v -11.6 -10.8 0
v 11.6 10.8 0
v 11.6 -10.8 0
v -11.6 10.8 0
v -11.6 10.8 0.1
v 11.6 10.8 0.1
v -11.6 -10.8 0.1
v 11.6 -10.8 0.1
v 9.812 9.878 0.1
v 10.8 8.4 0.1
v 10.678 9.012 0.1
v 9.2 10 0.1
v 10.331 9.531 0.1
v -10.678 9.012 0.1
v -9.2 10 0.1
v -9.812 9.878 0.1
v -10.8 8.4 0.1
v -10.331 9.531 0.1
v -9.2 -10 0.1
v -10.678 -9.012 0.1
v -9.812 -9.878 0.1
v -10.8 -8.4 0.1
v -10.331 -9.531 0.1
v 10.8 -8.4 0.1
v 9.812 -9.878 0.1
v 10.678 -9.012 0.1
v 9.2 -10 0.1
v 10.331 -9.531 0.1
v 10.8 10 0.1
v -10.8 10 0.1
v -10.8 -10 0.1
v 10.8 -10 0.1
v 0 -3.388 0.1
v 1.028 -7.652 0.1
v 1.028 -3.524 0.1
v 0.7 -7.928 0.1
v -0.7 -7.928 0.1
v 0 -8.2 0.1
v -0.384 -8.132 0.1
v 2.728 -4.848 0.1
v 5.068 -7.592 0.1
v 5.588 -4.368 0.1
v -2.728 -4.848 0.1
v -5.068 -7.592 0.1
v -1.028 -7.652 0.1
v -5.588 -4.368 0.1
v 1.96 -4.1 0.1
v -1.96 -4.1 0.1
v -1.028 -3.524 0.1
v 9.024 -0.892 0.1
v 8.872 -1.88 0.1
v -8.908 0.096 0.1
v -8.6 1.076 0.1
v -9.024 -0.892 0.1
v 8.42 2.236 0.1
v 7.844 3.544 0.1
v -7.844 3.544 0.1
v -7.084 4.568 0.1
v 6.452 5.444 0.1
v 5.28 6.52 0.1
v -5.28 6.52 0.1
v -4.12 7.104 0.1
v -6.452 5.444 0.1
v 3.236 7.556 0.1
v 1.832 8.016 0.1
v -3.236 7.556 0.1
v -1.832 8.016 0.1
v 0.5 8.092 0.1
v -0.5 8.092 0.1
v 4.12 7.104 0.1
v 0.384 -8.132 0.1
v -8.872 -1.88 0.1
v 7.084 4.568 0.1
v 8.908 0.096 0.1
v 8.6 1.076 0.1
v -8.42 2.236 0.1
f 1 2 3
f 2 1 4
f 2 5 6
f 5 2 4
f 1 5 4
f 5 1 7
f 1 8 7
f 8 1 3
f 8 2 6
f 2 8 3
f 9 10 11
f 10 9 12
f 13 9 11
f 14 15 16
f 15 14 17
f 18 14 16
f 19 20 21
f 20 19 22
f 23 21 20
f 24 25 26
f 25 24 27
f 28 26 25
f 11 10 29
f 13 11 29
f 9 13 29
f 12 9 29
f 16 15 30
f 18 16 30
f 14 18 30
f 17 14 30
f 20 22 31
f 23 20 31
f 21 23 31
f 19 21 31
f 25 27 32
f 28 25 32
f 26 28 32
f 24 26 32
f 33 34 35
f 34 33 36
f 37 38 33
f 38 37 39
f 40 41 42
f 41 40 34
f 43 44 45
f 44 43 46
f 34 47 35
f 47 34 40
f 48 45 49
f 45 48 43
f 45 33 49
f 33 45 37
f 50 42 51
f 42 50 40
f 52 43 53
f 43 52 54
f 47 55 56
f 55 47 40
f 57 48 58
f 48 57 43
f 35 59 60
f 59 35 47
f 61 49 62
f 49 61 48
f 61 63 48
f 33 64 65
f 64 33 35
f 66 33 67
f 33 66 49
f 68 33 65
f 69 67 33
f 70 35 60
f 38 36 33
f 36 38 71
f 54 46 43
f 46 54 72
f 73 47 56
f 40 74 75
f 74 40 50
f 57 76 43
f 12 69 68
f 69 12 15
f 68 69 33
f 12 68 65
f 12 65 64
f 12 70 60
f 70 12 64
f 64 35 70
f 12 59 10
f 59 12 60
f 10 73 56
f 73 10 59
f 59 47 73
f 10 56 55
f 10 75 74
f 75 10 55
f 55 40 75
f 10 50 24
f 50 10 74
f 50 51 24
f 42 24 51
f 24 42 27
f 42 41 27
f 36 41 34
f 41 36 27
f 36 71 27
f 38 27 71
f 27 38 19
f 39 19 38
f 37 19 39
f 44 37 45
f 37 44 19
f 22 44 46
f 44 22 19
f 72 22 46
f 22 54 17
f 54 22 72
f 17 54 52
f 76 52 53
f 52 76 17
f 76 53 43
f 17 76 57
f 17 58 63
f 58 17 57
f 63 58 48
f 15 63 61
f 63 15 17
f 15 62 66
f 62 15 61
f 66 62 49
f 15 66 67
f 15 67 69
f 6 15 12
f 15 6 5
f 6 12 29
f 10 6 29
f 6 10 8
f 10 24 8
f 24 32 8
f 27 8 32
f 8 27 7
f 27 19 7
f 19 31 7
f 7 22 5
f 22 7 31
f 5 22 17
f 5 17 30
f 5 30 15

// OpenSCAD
// file: ../p/4-4edge.scad
use <../lib.scad>
$fa=1; $fs=0.2;
function ldraw_lib__4_4edge(realsolid=false) = [
// 0 Circle 1.0
// 0 Name: 4-4edge.dat
// 0 Author: James Jessiman
// 0 !LDRAW_ORG Primitive UPDATE 2017-01
// 0 !LICENSE Licensed under CC BY 2.0 and CC BY 4.0 : see CAreadme.txt
// 
// 0 BFC CERTIFY CCW
  [0,"BFC","CERTIFY"],
  [0,"BFC","CCW"],
// 
// 0 !HISTORY 1998-12-15 [PTadmin] Official Update 1998-10
// 0 !HISTORY 2005-12-28 [PTadmin] Official Update 2005-01
// 0 !HISTORY 2007-06-24 [PTadmin] Header formatted for Contributor Agreement
// 0 !HISTORY 2008-07-01 [PTadmin] Official Update 2008-01
// 0 !HISTORY 2017-01-15 [Steffen] BFCed
// 0 !HISTORY 2017-12-30 [PTadmin] Official Update 2017-01
// 
// 
// 2 24 1 0 0 0.9239 0 0.3827
  [2,24,1,0,0,0.9239,0,0.3827],
// 2 24 0.9239 0 0.3827 0.7071 0 0.7071
  [2,24,0.9239,0,0.3827,0.7071,0,0.7071],
// 2 24 0.7071 0 0.7071 0.3827 0 0.9239
  [2,24,0.7071,0,0.7071,0.3827,0,0.9239],
// 2 24 0.3827 0 0.9239 0 0 1
  [2,24,0.3827,0,0.9239,0,0,1],
// 2 24 0 0 1 -0.3827 0 0.9239
  [2,24,0,0,1,-0.3827,0,0.9239],
// 2 24 -0.3827 0 0.9239 -0.7071 0 0.7071
  [2,24,-0.3827,0,0.9239,-0.7071,0,0.7071],
// 2 24 -0.7071 0 0.7071 -0.9239 0 0.3827
  [2,24,-0.7071,0,0.7071,-0.9239,0,0.3827],
// 2 24 -0.9239 0 0.3827 -1 0 -0
  [2,24,-0.9239,0,0.3827,-1,0,-0],
// 2 24 -1 0 -0 -0.9239 0 -0.3827
  [2,24,-1,0,-0,-0.9239,0,-0.3827],
// 2 24 -0.9239 0 -0.3827 -0.7071 0 -0.7071
  [2,24,-0.9239,0,-0.3827,-0.7071,0,-0.7071],
// 2 24 -0.7071 0 -0.7071 -0.3827 0 -0.9239
  [2,24,-0.7071,0,-0.7071,-0.3827,0,-0.9239],
// 2 24 -0.3827 0 -0.9239 0 0 -1
  [2,24,-0.3827,0,-0.9239,0,0,-1],
// 2 24 0 0 -1 0.3827 0 -0.9239
  [2,24,0,0,-1,0.3827,0,-0.9239],
// 2 24 0.3827 0 -0.9239 0.7071 0 -0.7071
  [2,24,0.3827,0,-0.9239,0.7071,0,-0.7071],
// 2 24 0.7071 0 -0.7071 0.9239 0 -0.3827
  [2,24,0.7071,0,-0.7071,0.9239,0,-0.3827],
// 2 24 0.9239 0 -0.3827 1 0 0
  [2,24,0.9239,0,-0.3827,1,0,0],
];
module ldraw_lib__4_4edge(step=0, col=false, unit=2/5, alt=false, line=0.2, solid=!$preview)
    makepoly(ldraw_lib__4_4edge(solid), step=step, col=col, unit=unit, alt=alt, line=line, solid=solid);
ldraw_lib__4_4edge(line=0.2);
// file: ../p/4-4disc.scad
use <../lib.scad>
$fa=1; $fs=0.2;
function ldraw_lib__4_4disc(realsolid=false) = [
// 0 Disc 1.0
// 0 Name: 4-4disc.dat
// 0 Author: James Jessiman
// 0 !LDRAW_ORG Primitive UPDATE 2002-02
// 0 !LICENSE Licensed under CC BY 2.0 and CC BY 4.0 : see CAreadme.txt
// 
// 0 BFC CERTIFY CCW
  [0,"BFC","CERTIFY"],
  [0,"BFC","CCW"],
// 
// 0 !HISTORY 1998-12-15 [PTadmin] Official Update 1998-10
// 0 !HISTORY 2002-03-23 [sbliss] Added BFC statement
// 0 !HISTORY 2002-04-25 [PTadmin] Official Update 2002-02
// 0 !HISTORY 2007-06-24 [PTadmin] Header formatted for Contributor Agreement
// 0 !HISTORY 2008-07-01 [PTadmin] Official Update 2008-01
// 
// 
// 3 16 0 0 0 1 0 0 0.9239 0 0.3827
  [3,16,0,0,0,1,0,0,0.9239,0,0.3827],
// 3 16 0 0 0 0.9239 0 0.3827 0.7071 0 0.7071
  [3,16,0,0,0,0.9239,0,0.3827,0.7071,0,0.7071],
// 3 16 0 0 0 0.7071 0 0.7071 0.3827 0 0.9239
  [3,16,0,0,0,0.7071,0,0.7071,0.3827,0,0.9239],
// 3 16 0 0 0 0.3827 0 0.9239 0 0 1
  [3,16,0,0,0,0.3827,0,0.9239,0,0,1],
// 3 16 0 0 0 0 0 1 -0.3827 0 0.9239
  [3,16,0,0,0,0,0,1,-0.3827,0,0.9239],
// 3 16 0 0 0 -0.3827 0 0.9239 -0.7071 0 0.7071
  [3,16,0,0,0,-0.3827,0,0.9239,-0.7071,0,0.7071],
// 3 16 0 0 0 -0.7071 0 0.7071 -0.9239 0 0.3827
  [3,16,0,0,0,-0.7071,0,0.7071,-0.9239,0,0.3827],
// 3 16 0 0 0 -0.9239 0 0.3827 -1 0 -0
  [3,16,0,0,0,-0.9239,0,0.3827,-1,0,-0],
// 3 16 0 0 0 -1 0 -0 -0.9239 0 -0.3827
  [3,16,0,0,0,-1,0,-0,-0.9239,0,-0.3827],
// 3 16 0 0 0 -0.9239 0 -0.3827 -0.7071 0 -0.7071
  [3,16,0,0,0,-0.9239,0,-0.3827,-0.7071,0,-0.7071],
// 3 16 0 0 0 -0.7071 0 -0.7071 -0.3827 0 -0.9239
  [3,16,0,0,0,-0.7071,0,-0.7071,-0.3827,0,-0.9239],
// 3 16 0 0 0 -0.3827 0 -0.9239 0 0 -1
  [3,16,0,0,0,-0.3827,0,-0.9239,0,0,-1],
// 3 16 0 0 0 0 0 -1 0.3827 0 -0.9239
  [3,16,0,0,0,0,0,-1,0.3827,0,-0.9239],
// 3 16 0 0 0 0.3827 0 -0.9239 0.7071 0 -0.7071
  [3,16,0,0,0,0.3827,0,-0.9239,0.7071,0,-0.7071],
// 3 16 0 0 0 0.7071 0 -0.7071 0.9239 0 -0.3827
  [3,16,0,0,0,0.7071,0,-0.7071,0.9239,0,-0.3827],
// 3 16 0 0 0 0.9239 0 -0.3827 1 0 0
  [3,16,0,0,0,0.9239,0,-0.3827,1,0,0],
// 0
];
module ldraw_lib__4_4disc(step=0, col=false, unit=2/5, alt=false, line=0.2, solid=!$preview)
    makepoly(ldraw_lib__4_4disc(solid), step=step, col=col, unit=unit, alt=alt, line=line, solid=solid);
ldraw_lib__4_4disc(line=0.2);
// file: ../p/4-4cyli.scad
use <../lib.scad>
$fa=1; $fs=0.2;
function ldraw_lib__4_4cyli(realsolid=false) = [
// 0 Cylinder 1.0
// 0 Name: 4-4cyli.dat
// 0 Author: James Jessiman
// 0 !LDRAW_ORG Primitive UPDATE 2005-01
// 0 !LICENSE Licensed under CC BY 2.0 and CC BY 4.0 : see CAreadme.txt
// 
// 0 BFC CERTIFY CCW
  [0,"BFC","CERTIFY"],
  [0,"BFC","CCW"],
// 
// 0 !HISTORY 1998-12-15 [PTadmin] Official Update 1998-10
// 0 !HISTORY 2002-03-23 [sbliss] Added BFC statement; merged headers from files in distributions LDraw 0.27 and Complete.
// 0 !HISTORY 2002-04-25 [PTadmin] Official Update 2002-02
// 0 !HISTORY 2004-12-14 [guyvivan] BFC CCW
// 0 !HISTORY 2005-12-28 [PTadmin] Official Update 2005-01
// 0 !HISTORY 2007-06-24 [PTadmin] Header formatted for Contributor Agreement
// 0 !HISTORY 2008-07-01 [PTadmin] Official Update 2008-01
// 
// 
// 4 16 1 1 0 0.9239 1 0.3827 0.9239 0 0.3827 1 0 0
  [4,16,1,1,0,0.9239,1,0.3827,0.9239,0,0.3827,1,0,0],
// 5 24 1 0 0 1 1 0 0.9239 0 0.3827 0.9239 0 -0.3827
  [5,24,1,0,0,1,1,0,0.9239,0,0.3827,0.9239,0,-0.3827],
// 4 16 0.9239 1 0.3827 0.7071 1 0.7071 0.7071 0 0.7071 0.9239 0 0.3827
  [4,16,0.9239,1,0.3827,0.7071,1,0.7071,0.7071,0,0.7071,0.9239,0,0.3827],
// 5 24 0.9239 0 0.3827 0.9239 1 0.3827 0.7071 0 0.7071 1 0 0
  [5,24,0.9239,0,0.3827,0.9239,1,0.3827,0.7071,0,0.7071,1,0,0],
// 4 16 0.7071 1 0.7071 0.3827 1 0.9239 0.3827 0 0.9239 0.7071 0 0.7071
  [4,16,0.7071,1,0.7071,0.3827,1,0.9239,0.3827,0,0.9239,0.7071,0,0.7071],
// 5 24 0.7071 0 0.7071 0.7071 1 0.7071 0.3827 0 0.9239 0.9239 0 0.3827
  [5,24,0.7071,0,0.7071,0.7071,1,0.7071,0.3827,0,0.9239,0.9239,0,0.3827],
// 4 16 0.3827 1 0.9239 0 1 1 0 0 1 0.3827 0 0.9239
  [4,16,0.3827,1,0.9239,0,1,1,0,0,1,0.3827,0,0.9239],
// 5 24 0.3827 0 0.9239 0.3827 1 0.9239 0 0 1 0.7071 0 0.7071
  [5,24,0.3827,0,0.9239,0.3827,1,0.9239,0,0,1,0.7071,0,0.7071],
// 4 16 0 1 1 -0.3827 1 0.9239 -0.3827 0 0.9239 0 0 1
  [4,16,0,1,1,-0.3827,1,0.9239,-0.3827,0,0.9239,0,0,1],
// 5 24 0 0 1 0 1 1 -0.3827 0 0.9239 0.3827 0 0.9239
  [5,24,0,0,1,0,1,1,-0.3827,0,0.9239,0.3827,0,0.9239],
// 4 16 -0.3827 1 0.9239 -0.7071 1 0.7071 -0.7071 0 0.7071 -0.3827 0 0.9239
  [4,16,-0.3827,1,0.9239,-0.7071,1,0.7071,-0.7071,0,0.7071,-0.3827,0,0.9239],
// 5 24 -0.3827 0 0.9239 -0.3827 1 0.9239 -0.7071 0 0.7071 0 0 1
  [5,24,-0.3827,0,0.9239,-0.3827,1,0.9239,-0.7071,0,0.7071,0,0,1],
// 4 16 -0.7071 1 0.7071 -0.9239 1 0.3827 -0.9239 0 0.3827 -0.7071 0 0.7071
  [4,16,-0.7071,1,0.7071,-0.9239,1,0.3827,-0.9239,0,0.3827,-0.7071,0,0.7071],
// 5 24 -0.7071 0 0.7071 -0.7071 1 0.7071 -0.9239 0 0.3827 -0.3827 0 0.9239
  [5,24,-0.7071,0,0.7071,-0.7071,1,0.7071,-0.9239,0,0.3827,-0.3827,0,0.9239],
// 4 16 -0.9239 1 0.3827 -1 1 0 -1 0 0 -0.9239 0 0.3827
  [4,16,-0.9239,1,0.3827,-1,1,0,-1,0,0,-0.9239,0,0.3827],
// 5 24 -0.9239 0 0.3827 -0.9239 1 0.3827 -1 0 0 -0.7071 0 0.7071
  [5,24,-0.9239,0,0.3827,-0.9239,1,0.3827,-1,0,0,-0.7071,0,0.7071],
// 4 16 -1 1 0 -0.9239 1 -0.3827 -0.9239 0 -0.3827 -1 0 0
  [4,16,-1,1,0,-0.9239,1,-0.3827,-0.9239,0,-0.3827,-1,0,0],
// 5 24 -1 0 0 -1 1 0 -0.9239 0 -0.3827 -0.9239 0 0.3827
  [5,24,-1,0,0,-1,1,0,-0.9239,0,-0.3827,-0.9239,0,0.3827],
// 4 16 -0.9239 1 -0.3827 -0.7071 1 -0.7071 -0.7071 0 -0.7071 -0.9239 0 -0.3827
  [4,16,-0.9239,1,-0.3827,-0.7071,1,-0.7071,-0.7071,0,-0.7071,-0.9239,0,-0.3827],
// 5 24 -0.9239 0 -0.3827 -0.9239 1 -0.3827 -0.7071 0 -0.7071 -1 0 0
  [5,24,-0.9239,0,-0.3827,-0.9239,1,-0.3827,-0.7071,0,-0.7071,-1,0,0],
// 4 16 -0.7071 1 -0.7071 -0.3827 1 -0.9239 -0.3827 0 -0.9239 -0.7071 0 -0.7071
  [4,16,-0.7071,1,-0.7071,-0.3827,1,-0.9239,-0.3827,0,-0.9239,-0.7071,0,-0.7071],
// 5 24 -0.7071 0 -0.7071 -0.7071 1 -0.7071 -0.3827 0 -0.9239 -0.9239 0 -0.3827
  [5,24,-0.7071,0,-0.7071,-0.7071,1,-0.7071,-0.3827,0,-0.9239,-0.9239,0,-0.3827],
// 4 16 -0.3827 1 -0.9239 0 1 -1 0 0 -1 -0.3827 0 -0.9239
  [4,16,-0.3827,1,-0.9239,0,1,-1,0,0,-1,-0.3827,0,-0.9239],
// 5 24 -0.3827 0 -0.9239 -0.3827 1 -0.9239 0 0 -1 -0.7071 0 -0.7071
  [5,24,-0.3827,0,-0.9239,-0.3827,1,-0.9239,0,0,-1,-0.7071,0,-0.7071],
// 4 16 0 1 -1 0.3827 1 -0.9239 0.3827 0 -0.9239 0 0 -1
  [4,16,0,1,-1,0.3827,1,-0.9239,0.3827,0,-0.9239,0,0,-1],
// 5 24 0 0 -1 0 1 -1 0.3827 0 -0.9239 -0.3827 0 -0.9239
  [5,24,0,0,-1,0,1,-1,0.3827,0,-0.9239,-0.3827,0,-0.9239],
// 4 16 0.3827 1 -0.9239 0.7071 1 -0.7071 0.7071 0 -0.7071 0.3827 0 -0.9239
  [4,16,0.3827,1,-0.9239,0.7071,1,-0.7071,0.7071,0,-0.7071,0.3827,0,-0.9239],
// 5 24 0.3827 0 -0.9239 0.3827 1 -0.9239 0.7071 0 -0.7071 0 0 -1
  [5,24,0.3827,0,-0.9239,0.3827,1,-0.9239,0.7071,0,-0.7071,0,0,-1],
// 4 16 0.7071 1 -0.7071 0.9239 1 -0.3827 0.9239 0 -0.3827 0.7071 0 -0.7071
  [4,16,0.7071,1,-0.7071,0.9239,1,-0.3827,0.9239,0,-0.3827,0.7071,0,-0.7071],
// 5 24 0.7071 0 -0.7071 0.7071 1 -0.7071 0.9239 0 -0.3827 0.3827 0 -0.9239
  [5,24,0.7071,0,-0.7071,0.7071,1,-0.7071,0.9239,0,-0.3827,0.3827,0,-0.9239],
// 4 16 0.9239 1 -0.3827 1 1 0 1 0 0 0.9239 0 -0.3827
  [4,16,0.9239,1,-0.3827,1,1,0,1,0,0,0.9239,0,-0.3827],
// 5 24 0.9239 0 -0.3827 0.9239 1 -0.3827 1 0 0 0.7071 0 -0.7071
  [5,24,0.9239,0,-0.3827,0.9239,1,-0.3827,1,0,0,0.7071,0,-0.7071],
// 0
];
module ldraw_lib__4_4cyli(step=0, col=false, unit=2/5, alt=false, line=0.2, solid=!$preview)
    makepoly(ldraw_lib__4_4cyli(solid), step=step, col=col, unit=unit, alt=alt, line=line, solid=solid);
ldraw_lib__4_4cyli(line=0.2);
// file: ../p/stud3.scad
use <../lib.scad>
use <4-4cyli.scad>
use <4-4disc.scad>
use <4-4edge.scad>
$fa=1; $fs=0.2;
function ldraw_lib__stud3(realsolid=false) = realsolid ? 
    [openscad(translate([0,0,-eps()], o=cylinder(4+eps(), r=4)),2)] : [
// 0 Stud Tube Solid
// 0 Name: stud3.dat
// 0 Author: James Jessiman
// 0 !LDRAW_ORG Primitive UPDATE 2012-01
// 0 !LICENSE Licensed under CC BY 2.0 and CC BY 4.0 : see CAreadme.txt
// 
// 0 BFC CERTIFY CCW
  [0,"BFC","CERTIFY"],
  [0,"BFC","CCW"],
// 
// 0 !HISTORY 2002-04-04 [sbliss] Modified for BFC compliance
// 0 !HISTORY 2002-04-25 [PTadmin] Official Update 2002-02
// 0 !HISTORY 2007-06-24 [PTadmin] Header formatted for Contributor Agreement
// 0 !HISTORY 2008-07-01 [PTadmin] Official Update 2008-01
// 0 !HISTORY 2012-02-16 [Philo] Changed to CCW
// 0 !HISTORY 2012-03-30 [PTadmin] Official Update 2012-01
// 
// 
// 1 16 0 -4 0 4 0 0 0 1 0 0 0 4 4-4edge.dat
  [1,16,0,-4,0,4,0,0,0,1,0,0,0,4, ldraw_lib__4_4edge(realsolid)],
// 1 16 0 0 0 4 0 0 0 1 0 0 0 4 4-4edge.dat
  [1,16,0,0,0,4,0,0,0,1,0,0,0,4, ldraw_lib__4_4edge(realsolid)],
// 1 16 0 -4 0 4 0 0 0 1 0 0 0 4 4-4disc.dat
  [1,16,0,-4,0,4,0,0,0,1,0,0,0,4, ldraw_lib__4_4disc(realsolid)],
// 1 16 0 -4 0 4 0 0 0 4 0 0 0 4 4-4cyli.dat
  [1,16,0,-4,0,4,0,0,0,4,0,0,0,4, ldraw_lib__4_4cyli(realsolid)],
];
module ldraw_lib__stud3(step=0, col=false, unit=2/5, alt=false, line=0.2, solid=!$preview)
    makepoly(ldraw_lib__stud3(solid), step=step, col=col, unit=unit, alt=alt, line=line, solid=solid);
ldraw_lib__stud3(line=0.2);
// file: ../p/stud.scad
use <../lib.scad>
use <4-4cyli.scad>
use <4-4disc.scad>
use <4-4edge.scad>
$fa=1; $fs=0.2;
function ldraw_lib__stud(realsolid=false) = realsolid ? 
    [openscad(translate([0,0,-eps()], o=cylinder(4+eps(), r=6)),2)] : [
// 0 Stud
// 0 Name: stud.dat
// 0 Author: James Jessiman
// 0 !LDRAW_ORG Primitive UPDATE 2012-01
// 0 !LICENSE Licensed under CC BY 2.0 and CC BY 4.0 : see CAreadme.txt
// 
// 0 BFC CERTIFY CCW
  [0,"BFC","CERTIFY"],
  [0,"BFC","CCW"],
// 
// 0 !HISTORY 2002-04-04 [sbliss] Modified for BFC compliance
// 0 !HISTORY 2002-04-25 [PTadmin] Official Update 2002-02
// 0 !HISTORY 2007-06-24 [PTadmin] Header formatted for Contributor Agreement
// 0 !HISTORY 2008-07-01 [PTadmin] Official Update 2008-01
// 0 !HISTORY 2012-02-16 [Philo] Changed to CCW
// 0 !HISTORY 2012-03-30 [PTadmin] Official Update 2012-01
// 
// 
// 1 16 0 0 0 6 0 0 0 1 0 0 0 6 4-4edge.dat
  [1,16,0,0,0,6,0,0,0,1,0,0,0,6, ldraw_lib__4_4edge(realsolid)],
// 1 16 0 -4 0 6 0 0 0 1 0 0 0 6 4-4edge.dat
  [1,16,0,-4,0,6,0,0,0,1,0,0,0,6, ldraw_lib__4_4edge(realsolid)],
// 1 16 0 0 0 6 0 0 0 -4 0 0 0 6 4-4cyli.dat
  [1,16,0,0,0,6,0,0,0,-4,0,0,0,6, ldraw_lib__4_4cyli(realsolid)],
// 1 16 0 -4 0 6 0 0 0 1 0 0 0 6 4-4disc.dat
  [1,16,0,-4,0,6,0,0,0,1,0,0,0,6, ldraw_lib__4_4disc(realsolid)],
];
module ldraw_lib__stud(step=0, col=false, unit=2/5, alt=false, line=0.2, solid=!$preview)
    makepoly(ldraw_lib__stud(solid), step=step, col=col, unit=unit, alt=alt, line=line, solid=solid);
ldraw_lib__stud(line=0.2);
// file: ../p/box5.scad
use <../lib.scad>
$fa=1; $fs=0.2;
function ldraw_lib__box5(realsolid=false) = [
// 0 Box with 5 Faces and All Edges
// 0 Name: box5.dat
// 0 Author: James Jessiman
// 0 !LDRAW_ORG Primitive UPDATE 2012-01
// 0 !LICENSE Licensed under CC BY 2.0 and CC BY 4.0 : see CAreadme.txt
// 
// 0 BFC CERTIFY CCW
  [0,"BFC","CERTIFY"],
  [0,"BFC","CCW"],
// 
// 0 !HISTORY 2002-04-03 [sbliss] Modified for BFC compliance
// 0 !HISTORY 2002-04-25 [PTadmin] Official Update 2002-02
// 0 !HISTORY 2007-06-24 [PTadmin] Header formatted for Contributor Agreement
// 0 !HISTORY 2008-07-01 [PTadmin] Official Update 2008-01
// 0 !HISTORY 2012-02-16 [Philo] Changed to CCW
// 0 !HISTORY 2012-03-30 [PTadmin] Official Update 2012-01
// 
// 
// 2 24 1 1 1 -1 1 1
  [2,24,1,1,1,-1,1,1],
// 2 24 -1 1 1 -1 1 -1
  [2,24,-1,1,1,-1,1,-1],
// 2 24 -1 1 -1 1 1 -1
  [2,24,-1,1,-1,1,1,-1],
// 2 24 1 1 -1 1 1 1
  [2,24,1,1,-1,1,1,1],
// 2 24 1 0 1 -1 0 1
  [2,24,1,0,1,-1,0,1],
// 2 24 -1 0 1 -1 0 -1
  [2,24,-1,0,1,-1,0,-1],
// 2 24 -1 0 -1 1 0 -1
  [2,24,-1,0,-1,1,0,-1],
// 2 24 1 0 -1 1 0 1
  [2,24,1,0,-1,1,0,1],
// 2 24 1 0 1 1 1 1
  [2,24,1,0,1,1,1,1],
// 2 24 -1 0 1 -1 1 1
  [2,24,-1,0,1,-1,1,1],
// 2 24 1 0 -1 1 1 -1
  [2,24,1,0,-1,1,1,-1],
// 2 24 -1 0 -1 -1 1 -1
  [2,24,-1,0,-1,-1,1,-1],
// 4 16 -1 1 1 1 1 1 1 1 -1 -1 1 -1
  [4,16,-1,1,1,1,1,1,1,1,-1,-1,1,-1],
// 4 16 -1 1 1 -1 0 1 1 0 1 1 1 1
  [4,16,-1,1,1,-1,0,1,1,0,1,1,1,1],
// 4 16 -1 1 -1 -1 0 -1 -1 0 1 -1 1 1
  [4,16,-1,1,-1,-1,0,-1,-1,0,1,-1,1,1],
// 4 16 1 1 -1 1 0 -1 -1 0 -1 -1 1 -1
  [4,16,1,1,-1,1,0,-1,-1,0,-1,-1,1,-1],
// 4 16 1 1 1 1 0 1 1 0 -1 1 1 -1
  [4,16,1,1,1,1,0,1,1,0,-1,1,1,-1],
];
module ldraw_lib__box5(step=0, col=false, unit=2/5, alt=false, line=0.2, solid=!$preview)
    makepoly(ldraw_lib__box5(solid), step=step, col=col, unit=unit, alt=alt, line=line, solid=solid);
ldraw_lib__box5(line=0.2);
// file: ../p/box4t.scad
use <../lib.scad>
$fa=1; $fs=0.2;
function ldraw_lib__box4t(realsolid=false) = [
// 0 Box with 4 Adjacent Faces and All Edges
// 0 Name: box4t.dat
// 0 Author: Tore Eriksson [Tore_Eriksson]
// 0 !LDRAW_ORG Primitive UPDATE 2003-02
// 0 !LICENSE Licensed under CC BY 2.0 and CC BY 4.0 : see CAreadme.txt
// 
// 0 BFC CERTIFY CCW
  [0,"BFC","CERTIFY"],
  [0,"BFC","CCW"],
// 
// 0 !HISTORY 1997-09-29 [PTadmin] Official Update 1997-15
// 0 !HISTORY 2002-08-31 [izanette] Modified with WINDZ for BFC compliance
// 0 !HISTORY 2003-08-01 [PTadmin] Official Update 2003-02
// 0 !HISTORY 2007-06-24 [PTadmin] Header formatted for Contributor Agreement
// 0 !HISTORY 2008-07-01 [PTadmin] Official Update 2008-01
// 
// 
// 2 24 1 1 1 -1 1 1
  [2,24,1,1,1,-1,1,1],
// 2 24 -1 1 1 -1 1 -1
  [2,24,-1,1,1,-1,1,-1],
// 2 24 -1 1 -1 1 1 -1
  [2,24,-1,1,-1,1,1,-1],
// 2 24 1 1 -1 1 1 1
  [2,24,1,1,-1,1,1,1],
// 2 24 1 0 1 -1 0 1
  [2,24,1,0,1,-1,0,1],
// 2 24 -1 0 1 -1 0 -1
  [2,24,-1,0,1,-1,0,-1],
// 2 24 -1 0 -1 1 0 -1
  [2,24,-1,0,-1,1,0,-1],
// 2 24 1 0 -1 1 0 1
  [2,24,1,0,-1,1,0,1],
// 2 24 1 0 1 1 1 1
  [2,24,1,0,1,1,1,1],
// 2 24 -1 0 1 -1 1 1
  [2,24,-1,0,1,-1,1,1],
// 2 24 1 0 -1 1 1 -1
  [2,24,1,0,-1,1,1,-1],
// 2 24 -1 0 -1 -1 1 -1
  [2,24,-1,0,-1,-1,1,-1],
// 4 16 1 1 1 1 1 -1 -1 1 -1 -1 1 1
  [4,16,1,1,1,1,1,-1,-1,1,-1,-1,1,1],
// 4 16 1 1 1 -1 1 1 -1 0 1 1 0 1
  [4,16,1,1,1,-1,1,1,-1,0,1,1,0,1],
// 4 16 -1 1 1 -1 1 -1 -1 0 -1 -1 0 1
  [4,16,-1,1,1,-1,1,-1,-1,0,-1,-1,0,1],
// 0 4 16 -1 1 -1 -1 0 -1 1 0 -1 1 1 -1
// 4 16 1 1 -1 1 1 1 1 0 1 1 0 -1
  [4,16,1,1,-1,1,1,1,1,0,1,1,0,-1],
// 0
];
module ldraw_lib__box4t(step=0, col=false, unit=2/5, alt=false, line=0.2, solid=!$preview)
    makepoly(ldraw_lib__box4t(solid), step=step, col=col, unit=unit, alt=alt, line=line, solid=solid);
ldraw_lib__box4t(line=0.2);
// file: s/3004s01.scad
use <../../lib.scad>
use <../../p/box4t.scad>
use <../../p/box5.scad>
use <../../p/stud.scad>
use <../../p/stud3.scad>
$fa=1; $fs=0.2;
function ldraw_lib__s__3004s01(realsolid=false) = [
// 0 ~Brick  1 x  2 without Front Face
// 0 Name: s\3004s01.dat
// 0 Author: James Jessiman
// 0 !LDRAW_ORG Subpart UPDATE 2003-03
// 0 !LICENSE Licensed under CC BY 2.0 and CC BY 4.0 : see CAreadme.txt
// 
// 0 BFC CERTIFY CCW
  [0,"BFC","CERTIFY"],
  [0,"BFC","CCW"],
// 
// 0 !HISTORY 2003-09-07 [jriley] Subfiling, BFC
// 0 !HISTORY 2003-12-19 [PTadmin] Official Update 2003-03
// 0 !HISTORY 2007-08-29 [PTadmin] Header formatted for Contributor Agreement
// 0 !HISTORY 2008-07-01 [PTadmin] Official Update 2008-01
// 
// 
// 1 16 0 4 0 1 0 0 0 -5 0 0 0 1 stud3.dat
  [1,16,0,4,0,1,0,0,0,-5,0,0,0,1, ldraw_lib__stud3(realsolid)],
// 0 BFC INVERTNEXT
  [0,"BFC","INVERTNEXT"],
// 1 16 0 24 0 16 0 0 0 -20 0 0 0 6 box5.dat
  [1,16,0,24,0,16,0,0,0,-20,0,0,0,6, ldraw_lib__box5(realsolid)],
// 4 16 20 24 10 16 24 6 -16 24 6 -20 24 10
  [4,16,20,24,10,16,24,6,-16,24,6,-20,24,10],
// 4 16 -20 24 10 -16 24 6 -16 24 -6 -20 24 -10
  [4,16,-20,24,10,-16,24,6,-16,24,-6,-20,24,-10],
// 4 16 -20 24 -10 -16 24 -6 16 24 -6 20 24 -10
  [4,16,-20,24,-10,-16,24,-6,16,24,-6,20,24,-10],
// 4 16 20 24 -10 16 24 -6 16 24 6 20 24 10
  [4,16,20,24,-10,16,24,-6,16,24,6,20,24,10],
// 1 16 0 24 0 20 0 0 0 -24 0 0 0 10 box4t.dat
  [1,16,0,24,0,20,0,0,0,-24,0,0,0,10, ldraw_lib__box4t(realsolid)],
// 1 16 10 0 0 1 0 0 0 1 0 0 0 1 stud.dat
  [1,16,10,0,0,1,0,0,0,1,0,0,0,1, ldraw_lib__stud(realsolid)],
// 1 16 -10 0 0 1 0 0 0 1 0 0 0 1 stud.dat
  [1,16,-10,0,0,1,0,0,0,1,0,0,0,1, ldraw_lib__stud(realsolid)],
// 0
];
module ldraw_lib__s__3004s01(step=0, col=false, unit=2/5, alt=false, line=0.2, solid=!$preview)
    makepoly(ldraw_lib__s__3004s01(solid), step=step, col=col, unit=unit, alt=alt, line=line, solid=solid);
ldraw_lib__s__3004s01(line=0.2);
// file: 3004.scad
use <../lib.scad>
use <s/3004s01.scad>
$fa=1; $fs=0.2;
function ldraw_lib__3004(realsolid=false) = [
// 0 Brick  1 x  2
// 0 Name: 3004.dat
// 0 Author: James Jessiman
// 0 !LDRAW_ORG Part UPDATE 2022-05
// 0 !LICENSE Licensed under CC BY 2.0 and CC BY 4.0 : see CAreadme.txt
// 
// 0 BFC CERTIFY CCW
  [0,"BFC","CERTIFY"],
  [0,"BFC","CCW"],
// 
// 0 !HISTORY 2001-10-26 [PTadmin] Official Update 2001-01
// 0 !HISTORY 2002-05-07 {unknown} BFC Certification
// 0 !HISTORY 2002-06-11 [PTadmin] Official Update 2002-03
// 0 !HISTORY 2007-05-07 [PTadmin] Header formatted for Contributor Agreement
// 0 !HISTORY 2008-07-01 [PTadmin] Official Update 2008-01
// 0 !HISTORY 2022-08-04 [MagFors] Using subfile
// 0 !HISTORY 2022-09-15 [PTadmin] Official Update 2022-05
// 
// 
// 1 16 0 0 0 1 0 0 0 1 0 0 0 1 s\3004s01.dat
  [1,16,0,0,0,1,0,0,0,1,0,0,0,1, ldraw_lib__s__3004s01(realsolid)],
// 4 16 -20 24 -10 20 24 -10 20 0 -10 -20 0 -10
  [4,16,-20,24,-10,20,24,-10,20,0,-10,-20,0,-10],
];
module ldraw_lib__3004(step=0, col=false, unit=2/5, alt=false, line=0.2, solid=!$preview)
    makepoly(ldraw_lib__3004(solid), step=step, col=col, unit=unit, alt=alt, line=line, solid=solid);
ldraw_lib__3004(line=0.2);
// file: ../p/box5-12.scad
use <../lib.scad>
$fa=1; $fs=0.2;
function ldraw_lib__box5_12(realsolid=false) = [
// 0 Box with 5 Faces without Any Edges
// 0 Name: box5-12.dat
// 0 Author: Chris Dee [cwdee]
// 0 !LDRAW_ORG Primitive UPDATE 2009-02
// 0 !LICENSE Licensed under CC BY 2.0 and CC BY 4.0 : see CAreadme.txt
// 
// 0 BFC CERTIFY CCW
  [0,"BFC","CERTIFY"],
  [0,"BFC","CCW"],
// 
// 0 !HISTORY 2009-09-03 [PTadmin] Official Update 2009-02
// 
// 
// 4 16 1 1 1 1 1 -1 -1 1 -1 -1 1 1
  [4,16,1,1,1,1,1,-1,-1,1,-1,-1,1,1],
// 4 16 -1 0 1 1 0 1 1 1 1 -1 1 1
  [4,16,-1,0,1,1,0,1,1,1,1,-1,1,1],
// 4 16 -1 0 -1 -1 0 1 -1 1 1 -1 1 -1
  [4,16,-1,0,-1,-1,0,1,-1,1,1,-1,1,-1],
// 4 16 1 0 -1 -1 0 -1 -1 1 -1 1 1 -1
  [4,16,1,0,-1,-1,0,-1,-1,1,-1,1,1,-1],
// 4 16 1 0 1 1 0 -1 1 1 -1 1 1 1
  [4,16,1,0,1,1,0,-1,1,1,-1,1,1,1],
// 0
];
module ldraw_lib__box5_12(step=0, col=false, unit=2/5, alt=false, line=0.2, solid=!$preview)
    makepoly(ldraw_lib__box5_12(solid), step=step, col=col, unit=unit, alt=alt, line=line, solid=solid);
ldraw_lib__box5_12(line=0.2);
// file: ../p/1-4ndis.scad
use <../lib.scad>
$fa=1; $fs=0.2;
function ldraw_lib__1_4ndis(realsolid=false) = [
// 0 Disc Negative 0.25
// 0 Name: 1-4ndis.dat
// 0 Author: James Jessiman
// 0 !LDRAW_ORG Primitive UPDATE 2012-01
// 0 !LICENSE Licensed under CC BY 2.0 and CC BY 4.0 : see CAreadme.txt
// 
// 0 BFC CERTIFY CCW
  [0,"BFC","CERTIFY"],
  [0,"BFC","CCW"],
// 
// 0 !HISTORY 2002-03-23 [sbliss] Added BFC Statement
// 0 !HISTORY 2002-04-25 [PTadmin] Official Update 2002-02
// 0 !HISTORY 2007-06-22 [PTadmin] Header formatted for Contributor Agreement
// 0 !HISTORY 2008-07-01 [PTadmin] Official Update 2008-01
// 0 !HISTORY 2012-02-16 [Philo] Changed to CCW
// 0 !HISTORY 2012-03-30 [PTadmin] Official Update 2012-01
// 
// 
// 3 16 0.9239 0 0.3827 1 0 0 1 0 1
  [3,16,0.9239,0,0.3827,1,0,0,1,0,1],
// 3 16 0.7071 0 0.7071 0.9239 0 0.3827 1 0 1
  [3,16,0.7071,0,0.7071,0.9239,0,0.3827,1,0,1],
// 3 16 0.3827 0 0.9239 0.7071 0 0.7071 1 0 1
  [3,16,0.3827,0,0.9239,0.7071,0,0.7071,1,0,1],
// 3 16 0 0 1 0.3827 0 0.9239 1 0 1
  [3,16,0,0,1,0.3827,0,0.9239,1,0,1],
];
module ldraw_lib__1_4ndis(step=0, col=false, unit=2/5, alt=false, line=0.2, solid=!$preview)
    makepoly(ldraw_lib__1_4ndis(solid), step=step, col=col, unit=unit, alt=alt, line=line, solid=solid);
ldraw_lib__1_4ndis(line=0.2);
// file: ../p/1-4chrd.scad
use <../lib.scad>
$fa=1; $fs=0.2;
function ldraw_lib__1_4chrd(realsolid=false) = [
// 0 Chord 0.25
// 0 Name: 1-4chrd.dat
// 0 Author: Tony Hafner [hafhead]
// 0 !LDRAW_ORG Primitive UPDATE 2012-02
// 0 !LICENSE Licensed under CC BY 2.0 and CC BY 4.0 : see CAreadme.txt
// 
// 0 BFC CERTIFY CCW
  [0,"BFC","CERTIFY"],
  [0,"BFC","CCW"],
// 
// 0 !HISTORY 2004-04-22 [PTadmin] Official Update 2004-02
// 0 !HISTORY 2007-10-09 [PTadmin] Header formatted for Contributor Agreement
// 0 !HISTORY 2008-07-01 [PTadmin] Official Update 2008-01
// 0 !HISTORY 2012-08-02 [MMR1988] Re-creation with PrimGen2 and Rectifier
// 0 !HISTORY 2012-08-09 [PTadmin] Official Update 2012-02
// 
// 
// 4 16 0.9239 0 0.3827 0.3827 0 0.9239 0 0 1 1 0 0
  [4,16,0.9239,0,0.3827,0.3827,0,0.9239,0,0,1,1,0,0],
// 3 16 0.7071 0 0.7071 0.3827 0 0.9239 0.9239 0 0.3827
  [3,16,0.7071,0,0.7071,0.3827,0,0.9239,0.9239,0,0.3827],
];
module ldraw_lib__1_4chrd(step=0, col=false, unit=2/5, alt=false, line=0.2, solid=!$preview)
    makepoly(ldraw_lib__1_4chrd(solid), step=step, col=col, unit=unit, alt=alt, line=line, solid=solid);
ldraw_lib__1_4chrd(line=0.2);
// main file
use <../lib.scad>
use <../p/1-4chrd.scad>
use <../p/1-4ndis.scad>
use <../p/box5-12.scad>
$fa=1; $fs=0.2;
function ldraw_lib__160425a(realsolid=false) = [
// 0 Sticker  2.7 x  2.9 with Shell Logo 1971 on Red Rounded Rectangle
// 0 Name: 160425a.dat
// 0 Author: Takeshi Takahashi [RainbowDolphin]
// 0 !LDRAW_ORG Part UPDATE 2022-05
// 0 !LICENSE Licensed under CC BY 2.0 and CC BY 4.0 : see CAreadme.txt
// 
// 0 BFC CERTIFY CCW
  [0,"BFC","CERTIFY"],
  [0,"BFC","CCW"],
// 
// 0 !KEYWORDS Bricklink 6394stk01, Brickowl 826936, Metro park, Rebrickable 160425
// 0 !KEYWORDS Service station, Set 6394, Signboard
// 
// 0 !HISTORY 2022-09-15 [PTadmin] Official Update 2022-05
// 
// 
// 1 16 0 -0.25 0 29 0 0 0 0.25 0 0 0 27 box5-12.dat
  [1,16,0,-0.25,0,29,0,0,0,0.25,0,0,0,27, ldraw_lib__box5_12(realsolid)],
// 1 4 23 -0.25 21 4 0 0 0 1 0 0 0 4 1-4chrd.dat
  [1,4,23,-0.25,21,4,0,0,0,1,0,0,0,4, ldraw_lib__1_4chrd(realsolid)],
// 1 4 -23 -0.25 21 0 0 -4 0 1 0 4 0 0 1-4chrd.dat
  [1,4,-23,-0.25,21,0,0,-4,0,1,0,4,0,0, ldraw_lib__1_4chrd(realsolid)],
// 1 4 -23 -0.25 -21 -4 0 0 0 1 0 0 0 -4 1-4chrd.dat
  [1,4,-23,-0.25,-21,-4,0,0,0,1,0,0,0,-4, ldraw_lib__1_4chrd(realsolid)],
// 1 4 23 -0.25 -21 0 0 4 0 1 0 -4 0 0 1-4chrd.dat
  [1,4,23,-0.25,-21,0,0,4,0,1,0,-4,0,0, ldraw_lib__1_4chrd(realsolid)],
// 1 15 23 -0.25 21 4 0 0 0 1 0 0 0 4 1-4ndis.dat
  [1,15,23,-0.25,21,4,0,0,0,1,0,0,0,4, ldraw_lib__1_4ndis(realsolid)],
// 1 15 -23 -0.25 21 0 0 -4 0 1 0 4 0 0 1-4ndis.dat
  [1,15,-23,-0.25,21,0,0,-4,0,1,0,4,0,0, ldraw_lib__1_4ndis(realsolid)],
// 1 15 -23 -0.25 -21 -4 0 0 0 1 0 0 0 -4 1-4ndis.dat
  [1,15,-23,-0.25,-21,-4,0,0,0,1,0,0,0,-4, ldraw_lib__1_4ndis(realsolid)],
// 1 15 23 -0.25 -21 0 0 4 0 1 0 -4 0 0 1-4ndis.dat
  [1,15,23,-0.25,-21,0,0,4,0,1,0,-4,0,0, ldraw_lib__1_4ndis(realsolid)],
// 4 14 0 -0.25 -8.47 1.75 -0.25 -19.82 2.57 -0.25 -19.13 2.57 -0.25 -8.81
  [4,14,0,-0.25,-8.47,1.75,-0.25,-19.82,2.57,-0.25,-19.13,2.57,-0.25,-8.81],
// 4 14 -0.96 -0.25 -20.33 0 -0.25 -20.5 0 -0.25 -8.47 -1.75 -0.25 -19.82
  [4,14,-0.96,-0.25,-20.33,0,-0.25,-20.5,0,-0.25,-8.47,-1.75,-0.25,-19.82],
// 4 14 12.67 -0.25 -18.98 13.97 -0.25 -10.92 6.82 -0.25 -12.12 2.57 -0.25 -19.13
  [4,14,12.67,-0.25,-18.98,13.97,-0.25,-10.92,6.82,-0.25,-12.12,2.57,-0.25,-19.13],
// 4 14 -13.97 -0.25 -10.92 -12.67 -0.25 -18.98 -2.57 -0.25 -19.13 -6.82 -0.25 -12.12
  [4,14,-13.97,-0.25,-10.92,-12.67,-0.25,-18.98,-2.57,-0.25,-19.13,-6.82,-0.25,-12.12],
// 4 14 2.57 -0.25 -19.13 6.82 -0.25 -12.12 4.9 -0.25 -10.25 2.57 -0.25 -8.81
  [4,14,2.57,-0.25,-19.13,6.82,-0.25,-12.12,4.9,-0.25,-10.25,2.57,-0.25,-8.81],
// 4 14 -4.9 -0.25 -10.25 -6.82 -0.25 -12.12 -2.57 -0.25 -19.13 -2.57 -0.25 -8.81
  [4,14,-4.9,-0.25,-10.25,-6.82,-0.25,-12.12,-2.57,-0.25,-19.13,-2.57,-0.25,-8.81],
// 4 14 0 -0.25 -8.47 -2.57 -0.25 -8.81 -2.57 -0.25 -19.13 -1.75 -0.25 -19.82
  [4,14,0,-0.25,-8.47,-2.57,-0.25,-8.81,-2.57,-0.25,-19.13,-1.75,-0.25,-19.82],
// 4 14 6.82 -0.25 -12.12 13.97 -0.25 -10.92 22.18 -0.25 -4.7 22.56 -0.25 -2.23
  [4,14,6.82,-0.25,-12.12,13.97,-0.25,-10.92,22.18,-0.25,-4.7,22.56,-0.25,-2.23],
// 4 14 -6.82 -0.25 -12.12 -21.5 -0.25 2.69 -22.27 -0.25 0.24 -22.56 -0.25 -2.23
  [4,14,-6.82,-0.25,-12.12,-21.5,-0.25,2.69,-22.27,-0.25,0.24,-22.56,-0.25,-2.23],
// 4 14 4.9 -0.25 -10.25 6.82 -0.25 -12.12 21.05 -0.25 5.59 19.61 -0.25 8.86
  [4,14,4.9,-0.25,-10.25,6.82,-0.25,-12.12,21.05,-0.25,5.59,19.61,-0.25,8.86],
// 4 14 -4.9 -0.25 -10.25 -17.71 -0.25 11.42 -19.61 -0.25 8.86 -6.82 -0.25 -12.12
  [4,14,-4.9,-0.25,-10.25,-17.71,-0.25,11.42,-19.61,-0.25,8.86,-6.82,-0.25,-12.12],
// 4 14 2.57 -0.25 -8.81 4.9 -0.25 -10.25 16.129 -0.25 13.61 13.2 -0.25 16.3
  [4,14,2.57,-0.25,-8.81,4.9,-0.25,-10.25,16.129,-0.25,13.61,13.2,-0.25,16.3],
// 4 14 -2.57 -0.25 -8.81 -10.3 -0.25 17.76 -13.2 -0.25 16.3 -4.9 -0.25 -10.25
  [4,14,-2.57,-0.25,-8.81,-10.3,-0.25,17.76,-13.2,-0.25,16.3,-4.9,-0.25,-10.25],
// 3 14 -13.2 -0.25 16.3 -16.129 -0.25 13.61 -4.9 -0.25 -10.25
  [3,14,-13.2,-0.25,16.3,-16.129,-0.25,13.61,-4.9,-0.25,-10.25],
// 4 14 0 -0.25 -8.47 2.57 -0.25 -8.81 8.09 -0.25 18.89 4.58 -0.25 20.04
  [4,14,0,-0.25,-8.47,2.57,-0.25,-8.81,8.09,-0.25,18.89,4.58,-0.25,20.04],
// 4 14 -8.09 -0.25 18.89 -2.57 -0.25 -8.81 0 -0.25 -8.47 -4.58 -0.25 20.04
  [4,14,-8.09,-0.25,18.89,-2.57,-0.25,-8.81,0,-0.25,-8.47,-4.58,-0.25,20.04],
// 3 14 1.25 -0.25 20.23 0 -0.25 -8.47 4.58 -0.25 20.04
  [3,14,1.25,-0.25,20.23,0,-0.25,-8.47,4.58,-0.25,20.04],
// 3 14 -1.25 -0.25 20.23 -4.58 -0.25 20.04 0 -0.25 -8.47
  [3,14,-1.25,-0.25,20.23,-4.58,-0.25,20.04,0,-0.25,-8.47],
// 3 14 10.3 -0.25 17.76 2.57 -0.25 -8.81 13.2 -0.25 16.3
  [3,14,10.3,-0.25,17.76,2.57,-0.25,-8.81,13.2,-0.25,16.3],
// 4 14 0.96 -0.25 -20.33 1.75 -0.25 -19.82 0 -0.25 -8.47 0 -0.25 -20.5
  [4,14,0.96,-0.25,-20.33,1.75,-0.25,-19.82,0,-0.25,-8.47,0,-0.25,-20.5],
// 4 14 -6.82 -0.25 -12.12 -22.56 -0.25 -2.23 -22.18 -0.25 -4.7 -13.97 -0.25 -10.92
  [4,14,-6.82,-0.25,-12.12,-22.56,-0.25,-2.23,-22.18,-0.25,-4.7,-13.97,-0.25,-10.92],
// 3 14 17.71 -0.25 11.42 4.9 -0.25 -10.25 19.61 -0.25 8.86
  [3,14,17.71,-0.25,11.42,4.9,-0.25,-10.25,19.61,-0.25,8.86],
// 4 14 22.27 -0.25 0.24 21.5 -0.25 2.69 6.82 -0.25 -12.12 22.56 -0.25 -2.23
  [4,14,22.27,-0.25,0.24,21.5,-0.25,2.69,6.82,-0.25,-12.12,22.56,-0.25,-2.23],
// 3 14 -19.61 -0.25 8.86 -21.05 -0.25 5.59 -6.82 -0.25 -12.12
  [3,14,-19.61,-0.25,8.86,-21.05,-0.25,5.59,-6.82,-0.25,-12.12],
// 4 4 23 -0.25 25 -23 -0.25 25 -1.25 -0.25 20.23 1.25 -0.25 20.23
  [4,4,23,-0.25,25,-23,-0.25,25,-1.25,-0.25,20.23,1.25,-0.25,20.23],
// 3 4 1.25 -0.25 20.23 -1.25 -0.25 20.23 0 -0.25 -8.47
  [3,4,1.25,-0.25,20.23,-1.25,-0.25,20.23,0,-0.25,-8.47],
// 3 4 23 -0.25 25 1.25 -0.25 20.23 4.58 -0.25 20.04
  [3,4,23,-0.25,25,1.25,-0.25,20.23,4.58,-0.25,20.04],
// 3 4 23 -0.25 25 4.58 -0.25 20.04 8.09 -0.25 18.89
  [3,4,23,-0.25,25,4.58,-0.25,20.04,8.09,-0.25,18.89],
// 4 4 23 -0.25 25 8.09 -0.25 18.89 10.3 -0.25 17.76 13.2 -0.25 16.3
  [4,4,23,-0.25,25,8.09,-0.25,18.89,10.3,-0.25,17.76,13.2,-0.25,16.3],
// 3 4 8.09 -0.25 18.89 2.57 -0.25 -8.81 10.3 -0.25 17.76
  [3,4,8.09,-0.25,18.89,2.57,-0.25,-8.81,10.3,-0.25,17.76],
// 4 4 23 -0.25 25 13.2 -0.25 16.3 16.129 -0.25 13.61 27 -0.25 21
  [4,4,23,-0.25,25,13.2,-0.25,16.3,16.129,-0.25,13.61,27,-0.25,21],
// 4 4 27 -0.25 21 16.129 -0.25 13.61 17.71 -0.25 11.42 19.61 -0.25 8.86
  [4,4,27,-0.25,21,16.129,-0.25,13.61,17.71,-0.25,11.42,19.61,-0.25,8.86],
// 3 4 16.129 -0.25 13.61 4.9 -0.25 -10.25 17.71 -0.25 11.42
  [3,4,16.129,-0.25,13.61,4.9,-0.25,-10.25,17.71,-0.25,11.42],
// 3 4 27 -0.25 21 19.61 -0.25 8.86 21.05 -0.25 5.59
  [3,4,27,-0.25,21,19.61,-0.25,8.86,21.05,-0.25,5.59],
// 4 4 27 -0.25 21 21.05 -0.25 5.59 21.5 -0.25 2.69 22.27 -0.25 0.24
  [4,4,27,-0.25,21,21.05,-0.25,5.59,21.5,-0.25,2.69,22.27,-0.25,0.24],
// 3 4 21.05 -0.25 5.59 6.82 -0.25 -12.12 21.5 -0.25 2.69
  [3,4,21.05,-0.25,5.59,6.82,-0.25,-12.12,21.5,-0.25,2.69],
// 4 4 27 -0.25 21 22.27 -0.25 0.24 22.56 -0.25 -2.23 27 -0.25 -21
  [4,4,27,-0.25,21,22.27,-0.25,0.24,22.56,-0.25,-2.23,27,-0.25,-21],
// 3 4 22.56 -0.25 -2.23 22.18 -0.25 -4.7 27 -0.25 -21
  [3,4,22.56,-0.25,-2.23,22.18,-0.25,-4.7,27,-0.25,-21],
// 4 4 27 -0.25 -21 22.18 -0.25 -4.7 13.97 -0.25 -10.92 23 -0.25 -25
  [4,4,27,-0.25,-21,22.18,-0.25,-4.7,13.97,-0.25,-10.92,23,-0.25,-25],
// 3 4 13.97 -0.25 -10.92 12.67 -0.25 -18.98 23 -0.25 -25
  [3,4,13.97,-0.25,-10.92,12.67,-0.25,-18.98,23,-0.25,-25],
// 4 4 23 -0.25 -25 12.67 -0.25 -18.98 2.57 -0.25 -19.13 1.75 -0.25 -19.82
  [4,4,23,-0.25,-25,12.67,-0.25,-18.98,2.57,-0.25,-19.13,1.75,-0.25,-19.82],
// 3 4 1.75 -0.25 -19.82 0.96 -0.25 -20.33 23 -0.25 -25
  [3,4,1.75,-0.25,-19.82,0.96,-0.25,-20.33,23,-0.25,-25],
// 4 4 23 -0.25 -25 0.96 -0.25 -20.33 0 -0.25 -20.5 -23 -0.25 -25
  [4,4,23,-0.25,-25,0.96,-0.25,-20.33,0,-0.25,-20.5,-23,-0.25,-25],
// 3 4 -0.96 -0.25 -20.33 -23 -0.25 -25 0 -0.25 -20.5
  [3,4,-0.96,-0.25,-20.33,-23,-0.25,-25,0,-0.25,-20.5],
// 3 4 -1.75 -0.25 -19.82 -23 -0.25 -25 -0.96 -0.25 -20.33
  [3,4,-1.75,-0.25,-19.82,-23,-0.25,-25,-0.96,-0.25,-20.33],
// 4 4 -23 -0.25 -25 -1.75 -0.25 -19.82 -2.57 -0.25 -19.13 -12.67 -0.25 -18.98
  [4,4,-23,-0.25,-25,-1.75,-0.25,-19.82,-2.57,-0.25,-19.13,-12.67,-0.25,-18.98],
// 4 4 -27 -0.25 -21 -23 -0.25 -25 -12.67 -0.25 -18.98 -13.97 -0.25 -10.92
  [4,4,-27,-0.25,-21,-23,-0.25,-25,-12.67,-0.25,-18.98,-13.97,-0.25,-10.92],
// 3 4 -22.18 -0.25 -4.7 -27 -0.25 -21 -13.97 -0.25 -10.92
  [3,4,-22.18,-0.25,-4.7,-27,-0.25,-21,-13.97,-0.25,-10.92],
// 4 4 -27 -0.25 -21 -22.18 -0.25 -4.7 -22.56 -0.25 -2.23 -27 -0.25 21
  [4,4,-27,-0.25,-21,-22.18,-0.25,-4.7,-22.56,-0.25,-2.23,-27,-0.25,21],
// 3 4 -27 -0.25 21 -22.56 -0.25 -2.23 -22.27 -0.25 0.24
  [3,4,-27,-0.25,21,-22.56,-0.25,-2.23,-22.27,-0.25,0.24],
// 4 4 -27 -0.25 21 -22.27 -0.25 0.24 -21.5 -0.25 2.69 -21.05 -0.25 5.59
  [4,4,-27,-0.25,21,-22.27,-0.25,0.24,-21.5,-0.25,2.69,-21.05,-0.25,5.59],
// 3 4 -21.05 -0.25 5.59 -21.5 -0.25 2.69 -6.82 -0.25 -12.12
  [3,4,-21.05,-0.25,5.59,-21.5,-0.25,2.69,-6.82,-0.25,-12.12],
// 3 4 -27 -0.25 21 -21.05 -0.25 5.59 -19.61 -0.25 8.86
  [3,4,-27,-0.25,21,-21.05,-0.25,5.59,-19.61,-0.25,8.86],
// 4 4 -27 -0.25 21 -19.61 -0.25 8.86 -17.71 -0.25 11.42 -16.129 -0.25 13.61
  [4,4,-27,-0.25,21,-19.61,-0.25,8.86,-17.71,-0.25,11.42,-16.129,-0.25,13.61],
// 3 4 -16.129 -0.25 13.61 -17.71 -0.25 11.42 -4.9 -0.25 -10.25
  [3,4,-16.129,-0.25,13.61,-17.71,-0.25,11.42,-4.9,-0.25,-10.25],
// 4 4 -23 -0.25 25 -27 -0.25 21 -16.129 -0.25 13.61 -13.2 -0.25 16.3
  [4,4,-23,-0.25,25,-27,-0.25,21,-16.129,-0.25,13.61,-13.2,-0.25,16.3],
// 4 4 -23 -0.25 25 -13.2 -0.25 16.3 -10.3 -0.25 17.76 -8.09 -0.25 18.89
  [4,4,-23,-0.25,25,-13.2,-0.25,16.3,-10.3,-0.25,17.76,-8.09,-0.25,18.89],
// 3 4 -8.09 -0.25 18.89 -10.3 -0.25 17.76 -2.57 -0.25 -8.81
  [3,4,-8.09,-0.25,18.89,-10.3,-0.25,17.76,-2.57,-0.25,-8.81],
// 3 4 -23 -0.25 25 -8.09 -0.25 18.89 -4.58 -0.25 20.04
  [3,4,-23,-0.25,25,-8.09,-0.25,18.89,-4.58,-0.25,20.04],
// 3 4 -23 -0.25 25 -4.58 -0.25 20.04 -1.25 -0.25 20.23
  [3,4,-23,-0.25,25,-4.58,-0.25,20.04,-1.25,-0.25,20.23],
// 4 15 29 -0.25 27 -29 -0.25 27 -23 -0.25 25 23 -0.25 25
  [4,15,29,-0.25,27,-29,-0.25,27,-23,-0.25,25,23,-0.25,25],
// 3 15 29 -0.25 27 23 -0.25 25 27 -0.25 25
  [3,15,29,-0.25,27,23,-0.25,25,27,-0.25,25],
// 4 15 29 -0.25 27 27 -0.25 25 27 -0.25 21 29 -0.25 -27
  [4,15,29,-0.25,27,27,-0.25,25,27,-0.25,21,29,-0.25,-27],
// 3 15 27 -0.25 21 27 -0.25 -21 29 -0.25 -27
  [3,15,27,-0.25,21,27,-0.25,-21,29,-0.25,-27],
// 3 15 27 -0.25 -21 27 -0.25 -25 29 -0.25 -27
  [3,15,27,-0.25,-21,27,-0.25,-25,29,-0.25,-27],
// 4 15 29 -0.25 -27 27 -0.25 -25 23 -0.25 -25 -29 -0.25 -27
  [4,15,29,-0.25,-27,27,-0.25,-25,23,-0.25,-25,-29,-0.25,-27],
// 3 15 23 -0.25 -25 -23 -0.25 -25 -29 -0.25 -27
  [3,15,23,-0.25,-25,-23,-0.25,-25,-29,-0.25,-27],
// 3 15 -23 -0.25 -25 -27 -0.25 -25 -29 -0.25 -27
  [3,15,-23,-0.25,-25,-27,-0.25,-25,-29,-0.25,-27],
// 4 15 -29 -0.25 -27 -27 -0.25 -25 -27 -0.25 -21 -29 -0.25 27
  [4,15,-29,-0.25,-27,-27,-0.25,-25,-27,-0.25,-21,-29,-0.25,27],
// 3 15 -29 -0.25 27 -27 -0.25 -21 -27 -0.25 21
  [3,15,-29,-0.25,27,-27,-0.25,-21,-27,-0.25,21],
// 3 15 -29 -0.25 27 -27 -0.25 21 -27 -0.25 25
  [3,15,-29,-0.25,27,-27,-0.25,21,-27,-0.25,25],
// 3 15 -29 -0.25 27 -27 -0.25 25 -23 -0.25 25
  [3,15,-29,-0.25,27,-27,-0.25,25,-23,-0.25,25],
];
module ldraw_lib__160425a(step=0, col=false, unit=2/5, alt=false, line=0.2, solid=!$preview)
    makepoly(ldraw_lib__160425a(solid), step=step, col=col, unit=unit, alt=alt, line=line, solid=solid);
ldraw_lib__160425a(line=0.2);
